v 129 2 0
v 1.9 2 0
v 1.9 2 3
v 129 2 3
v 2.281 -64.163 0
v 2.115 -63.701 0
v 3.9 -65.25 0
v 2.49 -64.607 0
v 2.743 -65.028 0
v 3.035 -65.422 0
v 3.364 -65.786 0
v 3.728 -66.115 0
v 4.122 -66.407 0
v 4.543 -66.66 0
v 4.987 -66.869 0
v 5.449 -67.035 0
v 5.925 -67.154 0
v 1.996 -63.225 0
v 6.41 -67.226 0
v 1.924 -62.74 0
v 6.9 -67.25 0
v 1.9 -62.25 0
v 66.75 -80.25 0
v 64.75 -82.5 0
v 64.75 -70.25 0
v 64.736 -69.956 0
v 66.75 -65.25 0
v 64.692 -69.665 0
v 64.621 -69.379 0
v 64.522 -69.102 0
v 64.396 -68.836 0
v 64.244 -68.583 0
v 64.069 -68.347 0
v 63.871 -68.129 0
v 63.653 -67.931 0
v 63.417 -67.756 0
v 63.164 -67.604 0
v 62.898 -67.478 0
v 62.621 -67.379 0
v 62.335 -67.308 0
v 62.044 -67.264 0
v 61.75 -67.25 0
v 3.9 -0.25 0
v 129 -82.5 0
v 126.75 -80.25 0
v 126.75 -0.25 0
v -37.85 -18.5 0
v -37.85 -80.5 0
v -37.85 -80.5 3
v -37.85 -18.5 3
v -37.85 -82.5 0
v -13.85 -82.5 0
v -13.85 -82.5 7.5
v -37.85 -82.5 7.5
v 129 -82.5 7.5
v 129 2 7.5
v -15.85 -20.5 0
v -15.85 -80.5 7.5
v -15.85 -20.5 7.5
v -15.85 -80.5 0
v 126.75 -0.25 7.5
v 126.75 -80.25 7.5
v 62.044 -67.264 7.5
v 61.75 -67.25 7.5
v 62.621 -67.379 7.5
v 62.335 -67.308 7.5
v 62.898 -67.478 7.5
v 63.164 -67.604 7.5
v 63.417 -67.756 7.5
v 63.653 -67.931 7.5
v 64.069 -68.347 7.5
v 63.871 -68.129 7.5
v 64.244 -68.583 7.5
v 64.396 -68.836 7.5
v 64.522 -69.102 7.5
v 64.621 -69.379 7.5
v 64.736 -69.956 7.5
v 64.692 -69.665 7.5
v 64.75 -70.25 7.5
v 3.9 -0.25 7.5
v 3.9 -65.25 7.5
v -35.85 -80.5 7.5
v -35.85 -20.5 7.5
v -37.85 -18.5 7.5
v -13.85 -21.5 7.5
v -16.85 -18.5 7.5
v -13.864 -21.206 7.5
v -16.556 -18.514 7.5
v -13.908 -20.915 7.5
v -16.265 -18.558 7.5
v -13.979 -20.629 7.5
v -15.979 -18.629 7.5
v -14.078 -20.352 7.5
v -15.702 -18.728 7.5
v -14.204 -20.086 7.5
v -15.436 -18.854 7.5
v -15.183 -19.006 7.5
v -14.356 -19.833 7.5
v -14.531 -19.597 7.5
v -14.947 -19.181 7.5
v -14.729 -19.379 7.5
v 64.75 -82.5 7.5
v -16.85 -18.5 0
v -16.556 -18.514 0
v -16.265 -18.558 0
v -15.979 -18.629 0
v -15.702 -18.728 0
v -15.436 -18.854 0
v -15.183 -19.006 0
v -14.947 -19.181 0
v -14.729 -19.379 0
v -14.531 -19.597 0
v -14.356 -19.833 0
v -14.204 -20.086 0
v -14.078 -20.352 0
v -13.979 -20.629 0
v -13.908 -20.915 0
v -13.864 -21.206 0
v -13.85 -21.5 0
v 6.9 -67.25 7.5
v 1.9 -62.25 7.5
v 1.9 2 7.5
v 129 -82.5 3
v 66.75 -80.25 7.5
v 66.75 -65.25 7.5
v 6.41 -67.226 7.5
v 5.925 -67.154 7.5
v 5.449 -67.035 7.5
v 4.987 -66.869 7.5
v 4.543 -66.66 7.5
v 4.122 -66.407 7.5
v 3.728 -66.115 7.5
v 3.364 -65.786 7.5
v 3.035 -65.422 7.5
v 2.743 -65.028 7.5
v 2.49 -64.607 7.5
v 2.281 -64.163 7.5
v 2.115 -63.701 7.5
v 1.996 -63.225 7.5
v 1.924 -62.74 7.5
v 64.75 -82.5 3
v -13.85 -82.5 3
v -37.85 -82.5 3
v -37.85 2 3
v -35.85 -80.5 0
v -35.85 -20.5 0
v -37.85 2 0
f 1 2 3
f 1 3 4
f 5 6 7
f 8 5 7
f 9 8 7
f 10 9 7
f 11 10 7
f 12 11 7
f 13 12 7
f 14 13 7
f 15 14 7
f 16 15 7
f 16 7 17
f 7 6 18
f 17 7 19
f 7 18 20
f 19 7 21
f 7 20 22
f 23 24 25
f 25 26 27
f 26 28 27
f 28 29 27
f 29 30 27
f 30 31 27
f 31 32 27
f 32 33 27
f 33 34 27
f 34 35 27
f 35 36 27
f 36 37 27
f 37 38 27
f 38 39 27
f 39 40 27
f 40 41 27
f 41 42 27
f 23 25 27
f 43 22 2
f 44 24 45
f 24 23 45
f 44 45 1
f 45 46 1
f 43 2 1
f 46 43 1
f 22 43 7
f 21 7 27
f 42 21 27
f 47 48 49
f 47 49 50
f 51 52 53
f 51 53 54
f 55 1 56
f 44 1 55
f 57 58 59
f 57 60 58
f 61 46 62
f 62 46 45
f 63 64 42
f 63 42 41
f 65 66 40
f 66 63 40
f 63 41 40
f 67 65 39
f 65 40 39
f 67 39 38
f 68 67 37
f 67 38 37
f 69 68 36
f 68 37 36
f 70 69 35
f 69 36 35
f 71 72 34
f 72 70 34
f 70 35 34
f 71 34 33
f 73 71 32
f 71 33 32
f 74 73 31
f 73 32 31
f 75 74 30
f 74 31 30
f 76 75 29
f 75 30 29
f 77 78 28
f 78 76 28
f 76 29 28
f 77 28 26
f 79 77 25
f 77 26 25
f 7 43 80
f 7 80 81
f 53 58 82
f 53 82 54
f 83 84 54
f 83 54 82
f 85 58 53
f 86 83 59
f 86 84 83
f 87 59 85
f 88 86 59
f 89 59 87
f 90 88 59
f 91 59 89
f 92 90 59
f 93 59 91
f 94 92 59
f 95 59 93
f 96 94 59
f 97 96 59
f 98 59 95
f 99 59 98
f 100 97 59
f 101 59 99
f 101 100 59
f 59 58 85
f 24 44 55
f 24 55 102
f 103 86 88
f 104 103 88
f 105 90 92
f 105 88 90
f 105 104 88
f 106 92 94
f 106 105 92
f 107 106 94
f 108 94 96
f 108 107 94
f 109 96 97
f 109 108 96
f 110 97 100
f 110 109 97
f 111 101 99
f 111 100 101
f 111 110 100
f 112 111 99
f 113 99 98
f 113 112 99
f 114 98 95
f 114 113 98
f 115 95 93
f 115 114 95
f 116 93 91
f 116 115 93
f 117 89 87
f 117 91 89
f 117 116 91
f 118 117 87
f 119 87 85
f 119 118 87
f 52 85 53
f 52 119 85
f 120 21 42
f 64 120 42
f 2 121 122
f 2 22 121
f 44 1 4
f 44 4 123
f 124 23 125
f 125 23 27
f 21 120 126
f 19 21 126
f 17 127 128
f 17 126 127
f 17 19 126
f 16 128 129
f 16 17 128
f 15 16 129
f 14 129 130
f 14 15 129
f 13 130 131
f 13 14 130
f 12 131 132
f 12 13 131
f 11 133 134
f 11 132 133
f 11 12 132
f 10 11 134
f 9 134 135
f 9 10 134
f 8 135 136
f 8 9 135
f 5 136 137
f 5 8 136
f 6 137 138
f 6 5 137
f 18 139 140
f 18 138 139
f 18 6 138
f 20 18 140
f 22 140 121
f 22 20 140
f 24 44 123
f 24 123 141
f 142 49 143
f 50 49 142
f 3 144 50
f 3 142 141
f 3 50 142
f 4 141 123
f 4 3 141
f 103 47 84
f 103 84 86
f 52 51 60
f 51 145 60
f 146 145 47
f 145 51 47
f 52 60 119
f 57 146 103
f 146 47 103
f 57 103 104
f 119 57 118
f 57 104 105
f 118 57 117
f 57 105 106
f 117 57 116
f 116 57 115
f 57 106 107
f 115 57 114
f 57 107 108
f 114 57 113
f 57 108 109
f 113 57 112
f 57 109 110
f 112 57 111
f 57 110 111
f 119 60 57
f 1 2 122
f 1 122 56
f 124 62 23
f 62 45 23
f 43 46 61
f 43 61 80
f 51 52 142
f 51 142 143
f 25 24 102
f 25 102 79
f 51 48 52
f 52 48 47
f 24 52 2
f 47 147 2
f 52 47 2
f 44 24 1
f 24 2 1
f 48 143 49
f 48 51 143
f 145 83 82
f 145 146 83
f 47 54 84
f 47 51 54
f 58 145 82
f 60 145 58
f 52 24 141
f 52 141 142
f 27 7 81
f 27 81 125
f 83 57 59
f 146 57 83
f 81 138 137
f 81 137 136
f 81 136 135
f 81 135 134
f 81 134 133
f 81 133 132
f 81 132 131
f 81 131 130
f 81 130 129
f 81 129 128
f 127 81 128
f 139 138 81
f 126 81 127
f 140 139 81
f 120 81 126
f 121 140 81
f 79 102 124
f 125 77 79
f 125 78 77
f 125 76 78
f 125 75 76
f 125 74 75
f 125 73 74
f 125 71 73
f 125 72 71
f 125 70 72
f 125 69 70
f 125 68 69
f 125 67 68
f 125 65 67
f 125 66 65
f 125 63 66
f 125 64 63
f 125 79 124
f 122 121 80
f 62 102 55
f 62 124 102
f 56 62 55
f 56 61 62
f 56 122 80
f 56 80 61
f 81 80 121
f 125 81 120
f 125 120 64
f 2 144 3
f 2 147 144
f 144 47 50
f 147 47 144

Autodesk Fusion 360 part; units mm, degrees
sketch "Sketch2" plane through (0, 0, 0) normal (0, 0, 1) x (1, 0, 0)
  line L0 (0, 0) -> (127, 0)
  line L1 (127, 0) -> (127, -80.5)
  line L2 (127, -80.5) -> (0, -80.5)
  line L3 (0, -80.5) -> (0, 0)
  line L4 (66.75, -0.25) -> (126.75, -0.25)
  line L5 (126.75, -0.25) -> (126.75, -80.25)
  line L6 (126.75, -80.25) -> (66.75, -80.25)
  line L7 (66.75, -80.25) -> (66.75, -72.25)
  line L8 (66.75, -0.25) -> (3.9, -0.25)
  line L9 (3.9, -0.25) -> (3.9, -65.25)
  line L10 (3.9, -65.25) -> (65.75, -65.25)
  line L11 (66.75, -65.25) -> (66.75, -0.25)
  line L12 (-37.85, 2) -> (129, 2)
  line L13 (129, 2) -> (129, -82.5)
  line L14 (129, -82.5) -> (-37.85, -82.5)
  line L15 (-37.85, -82.5) -> (-37.85, 2)
  line L16 (127, 0) -> (0, -80.5) construction
  line L17 (0, 0) -> (127, -80.5) construction
  line L18 (-37.85, 2) -> (129, -82.5) construction
  line L19 (129, 2) -> (-37.85, -82.5) construction
  line L20 (45.575, -40.25) -> (129, -40.25) construction
  line L21 (126.75, -0.25) -> (66.75, -80.25) construction
  line L22 (66.75, -0.25) -> (126.75, -80.25) construction
  line L23 (66.75, -65.25) -> (66.75, -70.25)
  line L24 (1.9, -0.25) -> (1.9, -62.25)
  line L25 (3.9, -0.25) -> (1.9, -0.25) construction
  line L26 (6.9, -67.25) -> (61.75, -67.25)
  line L27 (65.75, -65.25) -> (66.75, -65.25)
  line L28 (66.75, -70.25) -> (66.75, -72.25)
  arc A0 (1.9, -62.25) -> (6.9, -67.25) centre (6.9, -62.25) ccw
  line L29 (-15.85, -20.5) -> (-35.85, -20.5)
  line L30 (-35.85, -20.5) -> (-35.85, -80.5)
  line L31 (-35.85, -80.5) -> (-15.85, -80.5)
  line L32 (-15.85, -80.5) -> (-15.85, -20.5)
  line L33 (-13.85, -80.5) -> (-37.85, -80.5)
  line L34 (-37.85, -18.5) -> (-16.85, -18.5)
  line L35 (-13.85, -21.5) -> (-13.85, -80.5)
  line L36 (1.9, -0.25) -> (1.9, 2)
  line L37 (-13.85, -80.5) -> (-13.85, -82.5)
  line L38 (66.75, -80.25) -> (66.75, -80.25)
  line L39 (61.75, -67.25) -> (61.75, -67.25)
  line L40 (64.75, -78.25) -> (64.75, -70.25)
  arc A1 (64.75, -70.25) -> (61.75, -67.25) centre (61.75, -70.25) ccw
  line L41 (64.75, -78.25) -> (64.75, -80.25)
  line L42 (64.75, -80.25) -> (64.75, -82.5)
  arc A2 (-13.85, -21.5) -> (-16.85, -18.5) centre (-16.85, -21.5) ccw
  point P0 (63.5, -40.25)
  point P1 (45.575, -40.25)
  point P2 (96.75, -40.25)
  point P3 (1.9, -67.25)
  point P4 (-13.85, -18.5)
  dimension "d4" = 127
  dimension "d5" = 80.5
  dimension "d6" = 60
  dimension "d7" = 80
  dimension "d12" = 62.85
  dimension "d13" = 65
  dimension "d17" = 166.85
  dimension "d18" = 84.5
  dimension "d23" = 0.25
  dimension "d24" = 2
  dimension "d25" = 2
  dimension "d26" = 2
  dimension "d28" = 67
  dimension "d31" = 2
  dimension "d33" = 5
  dimension "d36" = 20
  dimension "d37" = 60
  dimension "d39" = 19.75
  dimension "d41" = 2
  dimension "d42" = 24
  dimension "d45" = 2
  dimension "d46" = 3
  dimension "d50" = 3
  dimension "d51" = 2
extrude "Extrude1" add sketch "Sketch2" along normal blind 3 contours L0 L2 L3 L12 L14 L15 L34 L35 L36 L37 L42 A2 | L0 L2 L3 L24 L26 A0 L36 L40 A1 L41 L42 | L0 L1 L2 L12 L13 L14 L36 L42 | L0 L1 L2 L24 L26 A0 L36 L40 A1 L41 L42 | L15 L29 L30 L32 L33 L34 L35 A2 | L14 L15 L31 L33 L37 | L29 L30 L31 L32 L33 | L8 L9 L10 L11 L27 | L4 L5 L6 L7 L11 L23 L28 makes body 1
extrude "Extrude2" add sketch "Sketch2" along normal blind 7.5 separate body contours L0 L1 L2 L12 L13 L14 L36 L42 | L0 L1 L2 L24 L26 A0 L36 L40 A1 L41 L42 | L15 L29 L30 L32 L33 L34 L35 A2 | L14 L15 L31 L33 L37 makes body 2 at (44.2667, 2, 2.5) makes body 3 at (-37.85, -61.1667, 2.5)
equation "d28 = d13 + 2 mm"
equation "d42 = d36 + 4 mm"
